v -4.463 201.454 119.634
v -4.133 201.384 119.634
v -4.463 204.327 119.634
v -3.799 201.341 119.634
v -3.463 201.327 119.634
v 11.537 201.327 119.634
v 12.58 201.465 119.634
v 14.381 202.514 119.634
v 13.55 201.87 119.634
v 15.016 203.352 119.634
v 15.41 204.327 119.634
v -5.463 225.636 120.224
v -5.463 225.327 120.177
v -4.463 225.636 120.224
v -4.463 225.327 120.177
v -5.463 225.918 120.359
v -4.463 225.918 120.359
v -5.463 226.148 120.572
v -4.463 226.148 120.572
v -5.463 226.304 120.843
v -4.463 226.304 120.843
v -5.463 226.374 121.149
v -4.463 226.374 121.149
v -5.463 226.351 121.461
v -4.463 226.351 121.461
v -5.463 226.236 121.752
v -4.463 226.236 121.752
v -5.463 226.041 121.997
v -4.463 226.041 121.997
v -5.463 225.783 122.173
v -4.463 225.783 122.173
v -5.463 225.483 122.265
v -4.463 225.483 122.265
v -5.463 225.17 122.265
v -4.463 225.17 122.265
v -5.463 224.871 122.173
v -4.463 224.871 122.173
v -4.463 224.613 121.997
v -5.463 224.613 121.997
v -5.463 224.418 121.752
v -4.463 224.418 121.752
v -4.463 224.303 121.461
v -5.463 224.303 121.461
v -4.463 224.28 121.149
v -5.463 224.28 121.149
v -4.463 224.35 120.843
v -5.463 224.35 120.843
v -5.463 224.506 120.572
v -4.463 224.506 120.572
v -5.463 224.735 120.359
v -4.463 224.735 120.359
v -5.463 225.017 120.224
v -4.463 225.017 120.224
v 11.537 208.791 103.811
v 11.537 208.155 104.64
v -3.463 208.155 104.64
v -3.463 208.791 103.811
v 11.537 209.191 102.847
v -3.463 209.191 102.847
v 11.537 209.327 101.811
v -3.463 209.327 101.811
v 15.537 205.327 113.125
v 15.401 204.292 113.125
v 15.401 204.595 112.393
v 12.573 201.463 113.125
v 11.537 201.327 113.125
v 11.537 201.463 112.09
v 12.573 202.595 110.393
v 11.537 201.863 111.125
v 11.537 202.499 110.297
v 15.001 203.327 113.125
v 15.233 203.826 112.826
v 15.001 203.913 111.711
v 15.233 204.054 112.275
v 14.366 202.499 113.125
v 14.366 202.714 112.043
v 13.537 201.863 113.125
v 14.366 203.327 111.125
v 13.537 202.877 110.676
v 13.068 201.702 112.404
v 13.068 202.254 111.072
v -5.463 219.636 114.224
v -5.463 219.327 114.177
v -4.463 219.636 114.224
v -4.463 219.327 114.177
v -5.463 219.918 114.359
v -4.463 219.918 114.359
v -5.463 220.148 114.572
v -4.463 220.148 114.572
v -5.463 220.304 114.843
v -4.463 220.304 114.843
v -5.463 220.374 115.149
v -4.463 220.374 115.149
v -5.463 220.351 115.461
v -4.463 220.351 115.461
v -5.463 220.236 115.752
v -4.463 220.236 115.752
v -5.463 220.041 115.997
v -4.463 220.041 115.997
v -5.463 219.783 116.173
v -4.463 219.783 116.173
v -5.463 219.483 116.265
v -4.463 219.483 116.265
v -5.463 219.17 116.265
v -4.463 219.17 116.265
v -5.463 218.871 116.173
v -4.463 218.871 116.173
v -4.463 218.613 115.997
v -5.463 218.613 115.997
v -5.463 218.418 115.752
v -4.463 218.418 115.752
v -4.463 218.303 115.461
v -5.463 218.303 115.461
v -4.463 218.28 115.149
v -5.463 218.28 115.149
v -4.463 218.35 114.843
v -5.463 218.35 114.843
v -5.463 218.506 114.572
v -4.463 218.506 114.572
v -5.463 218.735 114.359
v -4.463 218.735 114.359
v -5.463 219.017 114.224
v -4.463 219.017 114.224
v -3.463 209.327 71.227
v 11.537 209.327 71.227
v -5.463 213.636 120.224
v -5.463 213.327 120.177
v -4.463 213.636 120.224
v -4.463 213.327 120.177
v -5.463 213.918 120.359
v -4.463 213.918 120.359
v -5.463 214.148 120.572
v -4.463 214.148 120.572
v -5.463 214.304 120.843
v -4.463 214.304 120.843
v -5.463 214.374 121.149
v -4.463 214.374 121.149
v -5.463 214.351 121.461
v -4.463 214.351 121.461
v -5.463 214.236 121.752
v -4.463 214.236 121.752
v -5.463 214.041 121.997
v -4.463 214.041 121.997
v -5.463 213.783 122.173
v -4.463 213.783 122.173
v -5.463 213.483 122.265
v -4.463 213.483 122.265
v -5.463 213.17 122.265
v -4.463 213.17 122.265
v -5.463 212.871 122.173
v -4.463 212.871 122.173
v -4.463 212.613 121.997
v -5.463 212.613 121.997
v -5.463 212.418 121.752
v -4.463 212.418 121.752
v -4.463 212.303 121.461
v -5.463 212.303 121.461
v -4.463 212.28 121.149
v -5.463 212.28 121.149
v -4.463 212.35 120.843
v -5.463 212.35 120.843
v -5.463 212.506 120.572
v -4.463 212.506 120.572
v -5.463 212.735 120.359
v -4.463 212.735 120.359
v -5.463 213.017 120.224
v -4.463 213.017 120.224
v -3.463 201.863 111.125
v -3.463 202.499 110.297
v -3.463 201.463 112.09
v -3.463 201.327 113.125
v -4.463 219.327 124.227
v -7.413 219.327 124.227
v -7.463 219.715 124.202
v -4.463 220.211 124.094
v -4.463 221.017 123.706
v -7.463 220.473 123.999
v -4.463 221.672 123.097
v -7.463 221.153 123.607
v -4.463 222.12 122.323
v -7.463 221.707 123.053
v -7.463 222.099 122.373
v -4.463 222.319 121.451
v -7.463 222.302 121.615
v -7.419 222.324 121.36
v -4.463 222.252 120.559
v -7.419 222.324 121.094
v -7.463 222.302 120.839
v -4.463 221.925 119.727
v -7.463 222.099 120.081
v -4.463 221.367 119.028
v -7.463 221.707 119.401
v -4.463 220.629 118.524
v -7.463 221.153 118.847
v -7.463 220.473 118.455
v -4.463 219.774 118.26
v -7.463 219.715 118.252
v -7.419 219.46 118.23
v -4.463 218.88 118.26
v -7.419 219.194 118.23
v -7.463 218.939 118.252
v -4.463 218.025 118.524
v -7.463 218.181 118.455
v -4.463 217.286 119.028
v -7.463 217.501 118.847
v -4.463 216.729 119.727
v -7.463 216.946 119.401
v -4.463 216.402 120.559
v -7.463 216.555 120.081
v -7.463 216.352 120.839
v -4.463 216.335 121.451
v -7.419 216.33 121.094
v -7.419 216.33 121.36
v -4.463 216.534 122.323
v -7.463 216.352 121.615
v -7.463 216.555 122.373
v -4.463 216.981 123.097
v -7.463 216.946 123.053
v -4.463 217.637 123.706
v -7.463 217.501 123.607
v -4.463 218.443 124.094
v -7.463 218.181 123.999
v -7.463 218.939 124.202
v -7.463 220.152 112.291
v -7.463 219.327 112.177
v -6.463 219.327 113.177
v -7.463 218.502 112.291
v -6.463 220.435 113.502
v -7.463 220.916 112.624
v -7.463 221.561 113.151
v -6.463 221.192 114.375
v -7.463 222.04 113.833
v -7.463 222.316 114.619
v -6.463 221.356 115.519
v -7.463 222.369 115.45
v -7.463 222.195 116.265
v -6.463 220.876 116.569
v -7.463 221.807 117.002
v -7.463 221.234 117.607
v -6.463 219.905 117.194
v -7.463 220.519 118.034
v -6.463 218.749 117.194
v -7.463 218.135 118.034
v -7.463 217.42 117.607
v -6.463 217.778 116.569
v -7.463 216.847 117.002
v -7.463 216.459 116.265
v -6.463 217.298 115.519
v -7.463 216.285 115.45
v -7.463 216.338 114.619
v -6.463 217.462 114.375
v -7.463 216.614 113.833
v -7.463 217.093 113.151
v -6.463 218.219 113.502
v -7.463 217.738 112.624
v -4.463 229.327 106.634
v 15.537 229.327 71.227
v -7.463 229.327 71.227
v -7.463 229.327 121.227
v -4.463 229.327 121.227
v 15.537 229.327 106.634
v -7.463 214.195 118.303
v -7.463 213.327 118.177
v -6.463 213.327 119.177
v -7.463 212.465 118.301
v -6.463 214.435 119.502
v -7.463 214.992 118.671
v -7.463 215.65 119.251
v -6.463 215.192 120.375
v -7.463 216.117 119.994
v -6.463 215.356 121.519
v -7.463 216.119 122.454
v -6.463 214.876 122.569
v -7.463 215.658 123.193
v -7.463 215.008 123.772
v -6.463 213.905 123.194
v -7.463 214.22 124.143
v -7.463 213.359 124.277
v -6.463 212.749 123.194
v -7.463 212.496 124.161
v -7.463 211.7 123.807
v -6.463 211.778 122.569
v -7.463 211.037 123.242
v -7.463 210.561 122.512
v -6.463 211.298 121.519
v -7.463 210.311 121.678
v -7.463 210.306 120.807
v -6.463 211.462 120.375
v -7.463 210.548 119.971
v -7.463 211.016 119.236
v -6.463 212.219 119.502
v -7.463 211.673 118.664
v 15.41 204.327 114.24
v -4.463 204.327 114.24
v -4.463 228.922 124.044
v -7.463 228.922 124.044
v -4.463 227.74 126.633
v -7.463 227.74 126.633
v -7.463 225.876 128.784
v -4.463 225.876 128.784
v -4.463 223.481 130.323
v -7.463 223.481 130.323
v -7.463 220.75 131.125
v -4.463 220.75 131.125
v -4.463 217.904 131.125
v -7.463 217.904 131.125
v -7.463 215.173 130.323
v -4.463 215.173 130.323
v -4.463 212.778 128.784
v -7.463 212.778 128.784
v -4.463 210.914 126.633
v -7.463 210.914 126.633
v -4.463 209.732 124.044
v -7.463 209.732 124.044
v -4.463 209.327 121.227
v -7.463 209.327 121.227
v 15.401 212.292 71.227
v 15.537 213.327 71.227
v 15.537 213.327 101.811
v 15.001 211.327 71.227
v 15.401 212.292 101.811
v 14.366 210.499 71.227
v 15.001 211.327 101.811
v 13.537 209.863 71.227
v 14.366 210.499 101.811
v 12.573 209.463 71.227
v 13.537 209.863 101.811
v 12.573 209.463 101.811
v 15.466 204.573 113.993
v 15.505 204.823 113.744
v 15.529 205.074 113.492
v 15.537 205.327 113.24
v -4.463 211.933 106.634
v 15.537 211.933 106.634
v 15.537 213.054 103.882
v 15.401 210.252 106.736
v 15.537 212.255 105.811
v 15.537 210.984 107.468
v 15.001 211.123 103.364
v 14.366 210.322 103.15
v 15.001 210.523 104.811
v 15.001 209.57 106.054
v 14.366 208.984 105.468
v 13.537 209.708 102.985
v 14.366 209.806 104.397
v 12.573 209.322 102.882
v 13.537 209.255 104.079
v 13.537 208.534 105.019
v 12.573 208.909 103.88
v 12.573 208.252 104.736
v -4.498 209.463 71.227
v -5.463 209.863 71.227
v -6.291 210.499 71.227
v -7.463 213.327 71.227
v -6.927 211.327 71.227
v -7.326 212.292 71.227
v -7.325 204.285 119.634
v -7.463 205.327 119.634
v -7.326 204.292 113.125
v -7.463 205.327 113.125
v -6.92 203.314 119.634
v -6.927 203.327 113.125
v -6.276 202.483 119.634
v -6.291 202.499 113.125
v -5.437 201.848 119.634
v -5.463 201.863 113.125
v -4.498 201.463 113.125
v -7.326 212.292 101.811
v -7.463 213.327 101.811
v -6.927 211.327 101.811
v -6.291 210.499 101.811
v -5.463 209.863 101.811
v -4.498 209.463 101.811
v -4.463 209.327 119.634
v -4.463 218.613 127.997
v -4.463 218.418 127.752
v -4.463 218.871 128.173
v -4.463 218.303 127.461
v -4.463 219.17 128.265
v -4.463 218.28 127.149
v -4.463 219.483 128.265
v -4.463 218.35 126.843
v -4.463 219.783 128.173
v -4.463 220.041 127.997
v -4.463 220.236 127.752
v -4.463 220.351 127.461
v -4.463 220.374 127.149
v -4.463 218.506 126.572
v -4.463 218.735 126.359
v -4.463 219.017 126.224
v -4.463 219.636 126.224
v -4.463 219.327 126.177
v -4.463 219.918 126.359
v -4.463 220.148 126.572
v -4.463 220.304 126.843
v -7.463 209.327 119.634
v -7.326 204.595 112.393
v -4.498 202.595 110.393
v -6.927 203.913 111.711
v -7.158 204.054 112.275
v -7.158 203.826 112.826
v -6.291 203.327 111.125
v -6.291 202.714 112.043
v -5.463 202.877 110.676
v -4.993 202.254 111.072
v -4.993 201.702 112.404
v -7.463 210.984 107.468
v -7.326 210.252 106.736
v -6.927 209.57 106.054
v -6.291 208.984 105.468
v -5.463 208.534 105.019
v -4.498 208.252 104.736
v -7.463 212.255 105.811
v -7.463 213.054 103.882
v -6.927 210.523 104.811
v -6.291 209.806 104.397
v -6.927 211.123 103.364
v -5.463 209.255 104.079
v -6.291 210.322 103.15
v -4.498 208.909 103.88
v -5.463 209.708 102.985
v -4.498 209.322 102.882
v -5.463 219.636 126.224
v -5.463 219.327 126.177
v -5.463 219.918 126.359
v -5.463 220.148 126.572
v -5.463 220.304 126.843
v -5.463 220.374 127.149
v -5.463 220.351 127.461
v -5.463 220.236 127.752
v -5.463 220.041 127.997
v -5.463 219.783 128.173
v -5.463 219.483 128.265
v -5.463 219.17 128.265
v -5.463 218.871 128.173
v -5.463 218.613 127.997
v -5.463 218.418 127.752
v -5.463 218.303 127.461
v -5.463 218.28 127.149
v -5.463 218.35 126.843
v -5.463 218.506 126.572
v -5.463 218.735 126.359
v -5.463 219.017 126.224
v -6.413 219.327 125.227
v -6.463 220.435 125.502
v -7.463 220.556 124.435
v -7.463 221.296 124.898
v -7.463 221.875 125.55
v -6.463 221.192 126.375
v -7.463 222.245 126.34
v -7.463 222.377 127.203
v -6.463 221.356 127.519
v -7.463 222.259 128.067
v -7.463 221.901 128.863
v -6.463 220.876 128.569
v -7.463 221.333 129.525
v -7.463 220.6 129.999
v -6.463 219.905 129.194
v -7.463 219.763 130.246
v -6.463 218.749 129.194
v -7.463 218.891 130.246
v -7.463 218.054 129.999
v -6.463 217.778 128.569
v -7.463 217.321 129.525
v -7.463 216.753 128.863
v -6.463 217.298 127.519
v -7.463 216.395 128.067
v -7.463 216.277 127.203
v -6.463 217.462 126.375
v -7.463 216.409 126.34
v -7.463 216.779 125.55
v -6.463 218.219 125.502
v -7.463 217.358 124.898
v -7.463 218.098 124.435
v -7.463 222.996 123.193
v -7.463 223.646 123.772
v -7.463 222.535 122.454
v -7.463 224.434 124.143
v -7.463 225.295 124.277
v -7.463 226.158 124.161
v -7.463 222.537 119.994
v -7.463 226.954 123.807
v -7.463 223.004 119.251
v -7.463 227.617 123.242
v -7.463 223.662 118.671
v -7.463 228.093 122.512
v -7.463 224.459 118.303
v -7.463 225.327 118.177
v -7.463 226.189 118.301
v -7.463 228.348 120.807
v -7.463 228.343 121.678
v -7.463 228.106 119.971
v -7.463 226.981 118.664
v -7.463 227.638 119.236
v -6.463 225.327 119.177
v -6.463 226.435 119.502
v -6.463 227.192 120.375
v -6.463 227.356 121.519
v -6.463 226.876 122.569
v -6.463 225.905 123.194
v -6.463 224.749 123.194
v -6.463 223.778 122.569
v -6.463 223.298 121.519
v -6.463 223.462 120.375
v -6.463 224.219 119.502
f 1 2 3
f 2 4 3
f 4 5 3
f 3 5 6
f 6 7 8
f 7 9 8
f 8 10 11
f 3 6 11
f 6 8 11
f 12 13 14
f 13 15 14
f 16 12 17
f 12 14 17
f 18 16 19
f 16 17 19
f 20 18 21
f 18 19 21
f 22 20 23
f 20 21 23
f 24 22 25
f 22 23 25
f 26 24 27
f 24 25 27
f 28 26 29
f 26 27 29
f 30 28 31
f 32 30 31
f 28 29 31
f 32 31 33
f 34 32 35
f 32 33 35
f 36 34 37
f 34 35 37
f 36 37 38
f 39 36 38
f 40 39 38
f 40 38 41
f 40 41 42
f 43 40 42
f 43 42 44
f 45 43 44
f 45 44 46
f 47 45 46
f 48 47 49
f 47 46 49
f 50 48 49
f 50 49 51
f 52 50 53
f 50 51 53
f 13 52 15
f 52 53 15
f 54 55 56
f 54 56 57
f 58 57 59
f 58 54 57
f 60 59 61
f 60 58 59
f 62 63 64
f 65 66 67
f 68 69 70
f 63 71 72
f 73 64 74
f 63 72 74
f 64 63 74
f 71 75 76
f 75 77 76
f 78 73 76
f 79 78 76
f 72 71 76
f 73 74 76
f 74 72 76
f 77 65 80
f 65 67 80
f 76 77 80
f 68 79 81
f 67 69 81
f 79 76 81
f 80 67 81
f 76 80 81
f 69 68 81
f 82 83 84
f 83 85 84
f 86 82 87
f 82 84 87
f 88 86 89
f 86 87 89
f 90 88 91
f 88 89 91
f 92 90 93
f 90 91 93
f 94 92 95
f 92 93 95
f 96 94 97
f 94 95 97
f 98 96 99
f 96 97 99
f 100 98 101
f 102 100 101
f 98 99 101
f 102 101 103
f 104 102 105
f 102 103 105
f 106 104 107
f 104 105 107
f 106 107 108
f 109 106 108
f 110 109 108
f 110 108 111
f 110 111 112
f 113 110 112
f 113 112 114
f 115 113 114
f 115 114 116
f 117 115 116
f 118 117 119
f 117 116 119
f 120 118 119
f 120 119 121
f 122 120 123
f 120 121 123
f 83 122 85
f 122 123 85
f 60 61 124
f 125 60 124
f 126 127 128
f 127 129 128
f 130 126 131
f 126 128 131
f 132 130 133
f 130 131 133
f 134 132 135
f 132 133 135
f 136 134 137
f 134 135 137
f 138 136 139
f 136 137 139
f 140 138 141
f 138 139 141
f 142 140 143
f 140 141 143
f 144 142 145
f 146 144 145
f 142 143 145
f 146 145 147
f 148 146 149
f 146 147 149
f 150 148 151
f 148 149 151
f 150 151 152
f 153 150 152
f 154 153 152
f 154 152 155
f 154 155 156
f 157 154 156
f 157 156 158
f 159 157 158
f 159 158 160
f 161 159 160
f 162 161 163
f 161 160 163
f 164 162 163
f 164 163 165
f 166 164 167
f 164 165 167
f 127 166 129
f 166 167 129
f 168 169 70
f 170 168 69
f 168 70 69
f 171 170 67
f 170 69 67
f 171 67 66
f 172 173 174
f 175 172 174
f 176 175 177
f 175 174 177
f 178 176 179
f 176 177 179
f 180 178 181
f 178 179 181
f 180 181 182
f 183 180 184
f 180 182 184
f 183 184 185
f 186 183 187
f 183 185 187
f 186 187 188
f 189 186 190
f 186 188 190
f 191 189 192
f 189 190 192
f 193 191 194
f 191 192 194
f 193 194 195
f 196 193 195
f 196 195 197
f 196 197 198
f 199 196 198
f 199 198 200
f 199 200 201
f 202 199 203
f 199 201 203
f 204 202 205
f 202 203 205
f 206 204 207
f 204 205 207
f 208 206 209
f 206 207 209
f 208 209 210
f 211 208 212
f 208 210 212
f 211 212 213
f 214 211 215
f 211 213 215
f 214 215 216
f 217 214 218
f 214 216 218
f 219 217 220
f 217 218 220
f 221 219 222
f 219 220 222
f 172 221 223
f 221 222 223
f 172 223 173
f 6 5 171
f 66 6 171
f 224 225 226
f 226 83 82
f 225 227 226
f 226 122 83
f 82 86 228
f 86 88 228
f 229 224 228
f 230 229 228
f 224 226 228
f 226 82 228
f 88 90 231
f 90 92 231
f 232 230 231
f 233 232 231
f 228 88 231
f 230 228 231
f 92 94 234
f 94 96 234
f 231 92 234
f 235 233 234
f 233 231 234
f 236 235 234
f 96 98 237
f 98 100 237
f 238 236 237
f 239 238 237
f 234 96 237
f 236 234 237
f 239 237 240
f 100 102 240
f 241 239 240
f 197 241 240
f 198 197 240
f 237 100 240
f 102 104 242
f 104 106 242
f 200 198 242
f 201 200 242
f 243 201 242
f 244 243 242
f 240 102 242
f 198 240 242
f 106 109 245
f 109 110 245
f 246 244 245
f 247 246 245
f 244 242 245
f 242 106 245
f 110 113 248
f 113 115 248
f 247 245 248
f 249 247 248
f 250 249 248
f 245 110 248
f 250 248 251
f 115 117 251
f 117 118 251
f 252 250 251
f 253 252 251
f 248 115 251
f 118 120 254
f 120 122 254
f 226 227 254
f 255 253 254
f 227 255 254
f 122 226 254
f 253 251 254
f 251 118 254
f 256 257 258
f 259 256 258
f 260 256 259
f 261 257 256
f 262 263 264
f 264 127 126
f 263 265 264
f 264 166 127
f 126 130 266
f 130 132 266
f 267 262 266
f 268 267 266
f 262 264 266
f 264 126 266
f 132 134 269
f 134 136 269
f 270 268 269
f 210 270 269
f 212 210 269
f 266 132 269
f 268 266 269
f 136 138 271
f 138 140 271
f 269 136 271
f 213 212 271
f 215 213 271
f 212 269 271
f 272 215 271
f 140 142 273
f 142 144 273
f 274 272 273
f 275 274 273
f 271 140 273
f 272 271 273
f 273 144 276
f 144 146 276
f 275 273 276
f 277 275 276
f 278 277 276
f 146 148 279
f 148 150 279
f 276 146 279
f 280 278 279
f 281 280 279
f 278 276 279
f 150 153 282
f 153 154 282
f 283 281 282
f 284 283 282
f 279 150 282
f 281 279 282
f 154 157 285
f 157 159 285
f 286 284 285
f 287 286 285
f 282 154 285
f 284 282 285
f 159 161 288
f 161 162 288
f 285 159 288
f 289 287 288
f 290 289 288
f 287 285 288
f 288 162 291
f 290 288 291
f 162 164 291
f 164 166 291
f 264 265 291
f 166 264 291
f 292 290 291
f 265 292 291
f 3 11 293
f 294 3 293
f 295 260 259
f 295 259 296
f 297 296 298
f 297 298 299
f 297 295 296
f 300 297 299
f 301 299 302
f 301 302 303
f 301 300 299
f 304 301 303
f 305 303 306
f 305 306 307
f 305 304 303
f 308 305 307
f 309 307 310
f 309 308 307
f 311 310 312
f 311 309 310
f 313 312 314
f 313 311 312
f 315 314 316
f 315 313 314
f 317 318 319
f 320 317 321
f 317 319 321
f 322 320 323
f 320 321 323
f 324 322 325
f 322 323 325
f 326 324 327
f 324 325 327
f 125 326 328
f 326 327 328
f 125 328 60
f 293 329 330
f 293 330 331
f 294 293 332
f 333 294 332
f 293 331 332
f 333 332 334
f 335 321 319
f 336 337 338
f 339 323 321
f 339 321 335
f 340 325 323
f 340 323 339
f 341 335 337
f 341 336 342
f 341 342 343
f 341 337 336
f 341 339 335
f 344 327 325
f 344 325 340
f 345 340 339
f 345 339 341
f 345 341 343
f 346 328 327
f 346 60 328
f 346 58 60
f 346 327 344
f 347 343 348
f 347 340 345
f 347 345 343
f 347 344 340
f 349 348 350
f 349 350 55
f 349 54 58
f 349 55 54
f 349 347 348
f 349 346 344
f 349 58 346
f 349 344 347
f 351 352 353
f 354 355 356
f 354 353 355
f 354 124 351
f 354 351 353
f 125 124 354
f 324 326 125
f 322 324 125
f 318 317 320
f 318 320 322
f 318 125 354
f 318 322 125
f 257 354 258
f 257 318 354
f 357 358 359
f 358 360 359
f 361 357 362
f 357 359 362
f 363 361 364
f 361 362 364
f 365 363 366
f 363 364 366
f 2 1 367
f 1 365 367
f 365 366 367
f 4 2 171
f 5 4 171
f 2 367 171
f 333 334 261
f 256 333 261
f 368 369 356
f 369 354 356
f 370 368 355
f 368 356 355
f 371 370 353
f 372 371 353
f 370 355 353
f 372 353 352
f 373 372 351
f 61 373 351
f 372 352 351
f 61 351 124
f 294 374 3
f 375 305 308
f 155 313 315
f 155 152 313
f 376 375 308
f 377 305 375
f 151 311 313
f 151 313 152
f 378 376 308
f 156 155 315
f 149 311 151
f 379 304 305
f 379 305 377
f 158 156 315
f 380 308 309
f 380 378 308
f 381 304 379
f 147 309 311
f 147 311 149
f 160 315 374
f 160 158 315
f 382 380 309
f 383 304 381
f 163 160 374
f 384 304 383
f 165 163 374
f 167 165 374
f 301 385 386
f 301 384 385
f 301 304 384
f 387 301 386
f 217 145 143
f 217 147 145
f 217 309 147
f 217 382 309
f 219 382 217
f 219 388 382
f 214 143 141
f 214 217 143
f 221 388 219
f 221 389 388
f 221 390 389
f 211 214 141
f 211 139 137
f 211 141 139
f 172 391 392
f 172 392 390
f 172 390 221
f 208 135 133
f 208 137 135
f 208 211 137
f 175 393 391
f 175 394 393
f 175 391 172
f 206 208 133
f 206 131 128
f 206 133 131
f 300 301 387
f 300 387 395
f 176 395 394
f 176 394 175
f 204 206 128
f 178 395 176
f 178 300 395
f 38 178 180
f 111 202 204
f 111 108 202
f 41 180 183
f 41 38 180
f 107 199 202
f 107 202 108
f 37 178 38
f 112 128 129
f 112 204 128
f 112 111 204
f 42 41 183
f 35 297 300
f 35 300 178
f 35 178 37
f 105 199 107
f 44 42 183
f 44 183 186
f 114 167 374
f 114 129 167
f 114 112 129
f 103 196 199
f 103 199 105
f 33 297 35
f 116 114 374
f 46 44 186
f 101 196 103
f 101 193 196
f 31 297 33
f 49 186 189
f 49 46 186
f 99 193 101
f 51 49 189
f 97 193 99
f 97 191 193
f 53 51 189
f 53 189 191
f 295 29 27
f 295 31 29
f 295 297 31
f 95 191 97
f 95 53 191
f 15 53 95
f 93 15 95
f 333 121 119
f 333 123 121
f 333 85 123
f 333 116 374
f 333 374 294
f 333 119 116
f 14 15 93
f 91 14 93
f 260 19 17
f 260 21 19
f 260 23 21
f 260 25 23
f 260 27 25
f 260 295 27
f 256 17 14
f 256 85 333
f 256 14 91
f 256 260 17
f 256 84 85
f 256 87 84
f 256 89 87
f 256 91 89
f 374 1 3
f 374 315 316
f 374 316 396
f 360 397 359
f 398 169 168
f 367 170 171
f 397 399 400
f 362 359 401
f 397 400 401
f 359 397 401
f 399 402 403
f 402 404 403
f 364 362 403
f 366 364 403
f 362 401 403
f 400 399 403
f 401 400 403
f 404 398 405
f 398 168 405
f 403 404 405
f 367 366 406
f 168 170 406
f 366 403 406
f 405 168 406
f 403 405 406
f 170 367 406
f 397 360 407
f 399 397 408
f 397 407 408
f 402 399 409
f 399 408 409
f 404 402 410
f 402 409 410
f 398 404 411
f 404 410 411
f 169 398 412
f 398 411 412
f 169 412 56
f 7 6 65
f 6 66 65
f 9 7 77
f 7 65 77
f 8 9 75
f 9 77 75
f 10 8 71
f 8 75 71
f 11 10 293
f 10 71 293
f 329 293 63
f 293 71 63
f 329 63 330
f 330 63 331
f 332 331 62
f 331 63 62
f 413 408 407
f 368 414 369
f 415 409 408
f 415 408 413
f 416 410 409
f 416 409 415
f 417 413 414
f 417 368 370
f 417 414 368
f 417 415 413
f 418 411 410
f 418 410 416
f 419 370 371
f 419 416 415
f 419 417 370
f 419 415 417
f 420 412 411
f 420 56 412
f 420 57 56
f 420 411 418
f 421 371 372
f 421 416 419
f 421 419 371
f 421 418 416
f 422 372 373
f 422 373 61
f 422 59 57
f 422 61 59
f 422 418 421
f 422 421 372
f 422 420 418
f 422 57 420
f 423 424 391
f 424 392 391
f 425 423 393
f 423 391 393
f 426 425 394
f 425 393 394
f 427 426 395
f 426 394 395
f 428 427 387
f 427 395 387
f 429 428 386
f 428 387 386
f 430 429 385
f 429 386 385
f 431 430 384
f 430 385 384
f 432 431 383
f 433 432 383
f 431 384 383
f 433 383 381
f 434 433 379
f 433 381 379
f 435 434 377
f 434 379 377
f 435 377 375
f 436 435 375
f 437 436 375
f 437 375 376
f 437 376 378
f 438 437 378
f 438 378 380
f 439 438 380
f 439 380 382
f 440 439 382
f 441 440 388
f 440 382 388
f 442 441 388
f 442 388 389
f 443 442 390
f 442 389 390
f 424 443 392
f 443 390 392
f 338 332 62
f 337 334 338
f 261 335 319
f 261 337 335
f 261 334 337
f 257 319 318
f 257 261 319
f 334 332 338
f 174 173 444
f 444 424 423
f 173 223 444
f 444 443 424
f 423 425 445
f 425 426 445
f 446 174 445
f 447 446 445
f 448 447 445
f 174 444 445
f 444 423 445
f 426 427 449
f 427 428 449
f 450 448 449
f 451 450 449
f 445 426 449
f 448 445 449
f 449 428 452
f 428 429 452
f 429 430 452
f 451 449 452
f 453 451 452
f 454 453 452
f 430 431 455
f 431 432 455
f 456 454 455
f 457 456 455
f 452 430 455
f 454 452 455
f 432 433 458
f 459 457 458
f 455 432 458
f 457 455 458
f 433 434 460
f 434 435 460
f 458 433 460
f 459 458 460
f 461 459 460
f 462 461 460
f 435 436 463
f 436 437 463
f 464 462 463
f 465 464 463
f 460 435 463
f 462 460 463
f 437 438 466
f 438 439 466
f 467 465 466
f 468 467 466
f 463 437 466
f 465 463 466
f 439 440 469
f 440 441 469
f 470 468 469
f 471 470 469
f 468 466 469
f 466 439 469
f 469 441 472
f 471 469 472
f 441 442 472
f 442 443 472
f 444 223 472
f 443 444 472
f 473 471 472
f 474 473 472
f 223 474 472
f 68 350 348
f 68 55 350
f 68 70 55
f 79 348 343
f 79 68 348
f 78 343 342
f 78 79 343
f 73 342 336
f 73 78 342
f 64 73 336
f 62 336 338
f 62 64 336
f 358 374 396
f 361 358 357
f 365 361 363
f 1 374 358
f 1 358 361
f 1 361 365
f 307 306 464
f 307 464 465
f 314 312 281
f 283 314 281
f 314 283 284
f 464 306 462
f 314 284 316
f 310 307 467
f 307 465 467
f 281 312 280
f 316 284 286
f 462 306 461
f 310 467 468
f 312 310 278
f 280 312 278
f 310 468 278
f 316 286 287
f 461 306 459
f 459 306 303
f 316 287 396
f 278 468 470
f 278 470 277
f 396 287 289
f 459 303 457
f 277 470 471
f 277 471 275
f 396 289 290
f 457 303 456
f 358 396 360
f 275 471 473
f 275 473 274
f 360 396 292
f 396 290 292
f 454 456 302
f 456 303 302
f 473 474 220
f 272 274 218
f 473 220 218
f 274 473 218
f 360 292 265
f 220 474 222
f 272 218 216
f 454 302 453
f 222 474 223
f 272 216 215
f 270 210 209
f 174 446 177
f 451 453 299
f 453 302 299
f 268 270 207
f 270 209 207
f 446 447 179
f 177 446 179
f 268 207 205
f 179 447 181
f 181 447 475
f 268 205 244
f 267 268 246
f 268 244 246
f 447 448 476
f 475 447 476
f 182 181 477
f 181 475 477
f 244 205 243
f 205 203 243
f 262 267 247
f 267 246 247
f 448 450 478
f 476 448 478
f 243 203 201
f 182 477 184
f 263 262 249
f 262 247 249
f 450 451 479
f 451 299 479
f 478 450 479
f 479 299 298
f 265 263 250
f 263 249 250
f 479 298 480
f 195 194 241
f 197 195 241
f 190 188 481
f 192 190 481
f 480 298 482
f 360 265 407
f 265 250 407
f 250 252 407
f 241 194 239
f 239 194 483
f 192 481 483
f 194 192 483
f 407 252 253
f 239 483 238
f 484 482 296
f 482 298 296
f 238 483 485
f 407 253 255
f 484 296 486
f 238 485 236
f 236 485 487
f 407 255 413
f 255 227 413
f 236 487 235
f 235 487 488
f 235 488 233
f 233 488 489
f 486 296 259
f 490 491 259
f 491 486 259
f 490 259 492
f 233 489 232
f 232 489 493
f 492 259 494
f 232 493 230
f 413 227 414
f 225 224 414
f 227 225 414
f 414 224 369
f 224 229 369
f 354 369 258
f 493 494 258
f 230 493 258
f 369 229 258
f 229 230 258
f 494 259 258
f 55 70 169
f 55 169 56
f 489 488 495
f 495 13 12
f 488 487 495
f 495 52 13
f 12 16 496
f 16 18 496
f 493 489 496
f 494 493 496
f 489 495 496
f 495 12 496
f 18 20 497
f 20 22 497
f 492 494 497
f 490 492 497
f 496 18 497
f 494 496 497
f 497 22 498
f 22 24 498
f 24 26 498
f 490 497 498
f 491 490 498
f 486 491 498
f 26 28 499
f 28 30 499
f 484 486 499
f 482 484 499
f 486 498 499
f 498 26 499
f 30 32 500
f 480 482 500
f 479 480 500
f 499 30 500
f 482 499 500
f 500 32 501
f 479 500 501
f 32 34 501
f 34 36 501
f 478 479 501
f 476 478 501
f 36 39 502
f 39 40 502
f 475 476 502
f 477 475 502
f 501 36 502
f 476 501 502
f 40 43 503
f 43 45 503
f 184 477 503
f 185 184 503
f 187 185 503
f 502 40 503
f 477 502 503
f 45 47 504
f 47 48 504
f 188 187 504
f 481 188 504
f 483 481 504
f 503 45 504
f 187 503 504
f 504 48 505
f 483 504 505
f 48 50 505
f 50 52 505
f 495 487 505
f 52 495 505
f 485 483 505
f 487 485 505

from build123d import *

# Parameters (mm, degrees)
SKETCH1_W                            = 48.407195654
SKETCH1_H                            = 28
BOSS_EXTRUDE1_DEPTH                  = 20
BOSS_EXTRUDE2_DEPTH                  = 3
CUT_EXTRUDE1_DEPTH                   = 20
CUT_EXTRUDE2_DEPTH                   = 266.217617444
F_6_0_6_DIAMETER_HOLE1_D             = 6
F_2_1_2_1_DIAMETER_HOLE1_D           = 2.1
F_2_1_2_1_DIAMETER_HOLE1_DEPTH       = 23
F_2_1_2_1_DIAMETER_HOLE1_CSINK_D     = 6.1
F_2_1_2_1_DIAMETER_HOLE1_CSINK_ANGLE = 90
FILLET1_R                            = 4


with BuildPart() as part:
    # Sketch1 → Boss-Extrude1 (new body)
    with BuildSketch(Plane(origin=(15.537250863, 0, 0), x_dir=(0, 0, -1), z_dir=(1, 0, 0))):
        with Locations((-95.430589359, 215.326974637)):
            Rectangle(SKETCH1_W, SKETCH1_H)
    extrude(amount=-BOSS_EXTRUDE1_DEPTH)

    # Sketch2 → Boss-Extrude2 (add)
    with BuildSketch(Plane.ZY.offset(4.462749137)):
        with BuildLine():
            Line((71.226991532, 201.326974637), (71.226991532, 229.326974637))
            Line((71.226991532, 229.326974637), (121.226991532, 229.326974637))
            ThreePointArc((121.226991532, 229.326974637), (131.226991532, 219.326974637), (121.226991532, 209.326974637))
            Line((121.226991532, 209.326974637), (119.634236905, 209.326974637))
            Line((119.634236905, 209.326974637), (119.634236905, 201.326974637))
            Line((119.634236905, 201.326974637), (71.226991532, 201.326974637))
        make_face()
    extrude(amount=BOSS_EXTRUDE2_DEPTH)

    # Sketch3 → Cut-Extrude1 (cut)
    with BuildSketch(Plane(origin=(15.537250863, 0, 0), x_dir=(0, 0, -1), z_dir=(1, 0, 0))):
        Polygon((-106.634187186, 211.932705929), (-106.634187186, 229.326974637), (-119.634187186, 229.326974637), (-119.634187186, 204.326974637), (-114.239918478, 204.326974637), align=None)
    extrude(amount=-CUT_EXTRUDE1_DEPTH, mode=Mode.SUBTRACT)

    # Sketch4 → Cut-Extrude2 (cut, through all)
    with BuildSketch(Plane.ZY.offset(7.462749137)):
        Polygon((71.226991532, 201.326974637), (111.468236905, 201.326974637), (103.468236905, 209.326974637), (71.226991532, 209.326974637), align=None)
    extrude(amount=-CUT_EXTRUDE2_DEPTH, mode=Mode.SUBTRACT)

    # Ø6.0 (6) Diameter Hole1 (through all)
    with Locations(Plane(origin=(-4.462749137, 0, 0), x_dir=(0, 0, -1), z_dir=(1, 0, 0))):
        with Locations((-121.226991532, 219.326974637)):
            Hole(F_6_0_6_DIAMETER_HOLE1_D / 2)

    # Ø2.1 (2.1) Diameter Hole1
    with Locations(Plane.ZY.offset(7.462749137)):
        with Locations((121.226991532, 225.326974637), (127.226991532, 219.326974637), (121.226991532, 213.326974637), (115.226991532, 219.326974637)):
            CounterSinkHole(F_2_1_2_1_DIAMETER_HOLE1_D / 2, F_2_1_2_1_DIAMETER_HOLE1_CSINK_D / 2, depth=F_2_1_2_1_DIAMETER_HOLE1_DEPTH, counter_sink_angle=F_2_1_2_1_DIAMETER_HOLE1_CSINK_ANGLE)

    # Fillet1
    fillet1_edges = [part.edges().sort_by_distance(p)[0] for p in [
        (15.537250863, 201.326974637, 115.551212045),
        (15.537250863, 209.326974637, 87.347614218),
        (15.537250863, 205.326974637, 107.468236905),
        (-7.462749137, 201.326974637, 115.551236905),
        (4.037250863, 201.326974637, 111.468236905),
        (-7.462749137, 205.326974637, 107.468236905),
        (-7.462749137, 209.326974637, 87.347614218),
        (4.037250863, 209.326974637, 103.468236905),
    ]]
    fillet(fillet1_edges, radius=FILLET1_R)


solid = part.part
